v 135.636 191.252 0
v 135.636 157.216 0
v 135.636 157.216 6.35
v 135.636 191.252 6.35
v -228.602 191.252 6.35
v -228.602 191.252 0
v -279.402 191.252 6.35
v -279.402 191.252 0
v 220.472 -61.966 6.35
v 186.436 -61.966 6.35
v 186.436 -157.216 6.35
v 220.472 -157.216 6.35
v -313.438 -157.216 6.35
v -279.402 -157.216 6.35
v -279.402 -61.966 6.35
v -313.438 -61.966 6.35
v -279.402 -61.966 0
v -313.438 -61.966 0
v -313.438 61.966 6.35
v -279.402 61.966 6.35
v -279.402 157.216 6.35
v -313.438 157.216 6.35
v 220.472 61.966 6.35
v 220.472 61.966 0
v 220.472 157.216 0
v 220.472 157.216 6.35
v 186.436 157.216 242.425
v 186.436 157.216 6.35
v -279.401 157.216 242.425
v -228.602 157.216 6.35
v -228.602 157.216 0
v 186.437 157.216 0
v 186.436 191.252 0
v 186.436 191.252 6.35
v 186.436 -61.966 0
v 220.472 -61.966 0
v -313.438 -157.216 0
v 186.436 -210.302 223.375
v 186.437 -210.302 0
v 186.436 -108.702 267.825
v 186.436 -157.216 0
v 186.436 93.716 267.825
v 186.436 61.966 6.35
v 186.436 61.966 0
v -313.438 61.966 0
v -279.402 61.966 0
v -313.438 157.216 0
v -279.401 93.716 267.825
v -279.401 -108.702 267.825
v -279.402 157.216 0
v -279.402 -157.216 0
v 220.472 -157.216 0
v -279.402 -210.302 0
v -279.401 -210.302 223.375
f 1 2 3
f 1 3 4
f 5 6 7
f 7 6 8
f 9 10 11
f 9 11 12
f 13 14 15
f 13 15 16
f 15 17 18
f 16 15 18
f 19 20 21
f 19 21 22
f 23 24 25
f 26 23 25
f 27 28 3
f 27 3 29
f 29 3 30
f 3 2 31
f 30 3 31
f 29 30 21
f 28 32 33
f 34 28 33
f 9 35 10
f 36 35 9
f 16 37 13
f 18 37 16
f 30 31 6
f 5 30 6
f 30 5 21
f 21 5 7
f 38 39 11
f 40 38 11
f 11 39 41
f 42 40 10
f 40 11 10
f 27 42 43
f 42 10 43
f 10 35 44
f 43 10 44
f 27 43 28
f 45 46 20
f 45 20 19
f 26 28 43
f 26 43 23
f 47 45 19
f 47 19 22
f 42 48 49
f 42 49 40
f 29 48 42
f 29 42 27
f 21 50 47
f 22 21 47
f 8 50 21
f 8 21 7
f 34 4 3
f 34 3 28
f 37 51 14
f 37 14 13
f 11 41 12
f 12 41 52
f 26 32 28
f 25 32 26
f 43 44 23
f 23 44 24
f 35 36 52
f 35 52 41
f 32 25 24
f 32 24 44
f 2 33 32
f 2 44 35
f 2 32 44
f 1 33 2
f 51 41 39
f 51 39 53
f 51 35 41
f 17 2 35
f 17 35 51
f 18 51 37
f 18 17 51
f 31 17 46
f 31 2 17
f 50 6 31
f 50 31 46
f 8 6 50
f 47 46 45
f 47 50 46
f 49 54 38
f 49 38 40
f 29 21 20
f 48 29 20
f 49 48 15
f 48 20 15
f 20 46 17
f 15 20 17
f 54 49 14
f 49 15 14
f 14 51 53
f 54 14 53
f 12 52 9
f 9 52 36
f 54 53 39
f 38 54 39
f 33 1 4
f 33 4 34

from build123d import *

# Parameters (mm, degrees)
SKETCH1_W           = 465.838
SKETCH1_H           = 367.518
BOSS_EXTRUDE1_DEPTH = 3.175
SKETCH2_W           = 3.175
SKETCH2_H           = 308.082
SKETCH2_W_2         = 87.632
SKETCH2_W_3         = 89.789
SKETCH2_W_4         = 459.488
SKETCH2_H_2         = 50.8
BOSS_EXTRUDE2_DEPTH = 200.6
SKETCH11_W          = 87.632
SKETCH11_H          = 308.082
SKETCH11_W_2        = 89.789
SKETCH11_W_3        = 3.175
SKETCH11_W_4        = 459.488
SKETCH11_H_2        = 50.8
SKETCH11_H_3        = 3.175
BOSS_EXTRUDE8_DEPTH = 64.05
SKETCH10_W          = 34.036
SKETCH10_H          = 95.25
SKETCH10_W_2        = 50.8
SKETCH10_H_2        = 34.036
BOSS_EXTRUDE7_DEPTH = 6.35
CUT_EXTRUDE1_DEPTH  = 605.839795074


with BuildPart() as part:
    # Sketch1 → Boss-Extrude1 (new body)
    with BuildSketch(Plane.XY):
        with Locations((-46.4825, -26.543)):
            Rectangle(SKETCH1_W, SKETCH1_H)
    extrude(amount=BOSS_EXTRUDE1_DEPTH)

    # Sketch2 → Boss-Extrude2 (add)
    with BuildSketch(Plane.XY.offset(3.175)):
        Polygon((186.4365, -210.302), (186.4365, -157.216), (183.2615, -157.216), (183.2615, -208.016), (-276.2265, -208.016), (-276.2265, -157.216), (-279.4015, -157.216), (-279.4015, -210.302), align=None)
        Polygon((183.2615, 154.041), (186.4365, 154.041), (186.4365, 157.216), (-279.4015, 157.216), (-279.4015, -157.216), (-276.2265, -157.216), (183.2615, -157.216), (186.4365, -157.216), (186.4365, -154.041), (183.2615, -154.041), (93.4725, -154.041), (90.2975, -154.041), (0.5085, -154.041), (-2.6665, -154.041), (-92.4555, -154.041), (-95.6305, -154.041), (-185.4195, -154.041), (-188.5945, -154.041), (-276.2265, -154.041), (-276.2265, 154.041), (-188.5945, 154.041), (-185.4195, 154.041), (-95.6305, 154.041), (-92.4555, 154.041), (-2.6665, 154.041), (0.5085, 154.041), (90.2975, 154.041), (93.4725, 154.041), align=None)
        with Locations((184.849, 0)):
            Rectangle(SKETCH2_W, SKETCH2_H)
        with Locations((91.885, 0)):
            Rectangle(SKETCH2_W, SKETCH2_H)
        with Locations((-187.007, 0)):
            Rectangle(SKETCH2_W, SKETCH2_H)
        with Locations((-94.043, 0)):
            Rectangle(SKETCH2_W, SKETCH2_H)
        with Locations((-1.079, 0)):
            Rectangle(SKETCH2_W, SKETCH2_H)
        with Locations((-232.4105, 0)):
            Rectangle(SKETCH2_W_2, SKETCH2_H)
        with Locations((-140.525, 0)):
            Rectangle(SKETCH2_W_3, SKETCH2_H)
        with Locations((-47.561, 0)):
            Rectangle(SKETCH2_W_3, SKETCH2_H)
        with Locations((45.403, 0)):
            Rectangle(SKETCH2_W_3, SKETCH2_H)
        with Locations((138.367, 0)):
            Rectangle(SKETCH2_W_3, SKETCH2_H)
        with Locations((-46.4825, -182.616)):
            Rectangle(SKETCH2_W_4, SKETCH2_H_2)
    extrude(amount=BOSS_EXTRUDE2_DEPTH)

    # Sketch11 → Boss-Extrude8 (add)
    with BuildSketch(Plane.XY.offset(203.775)):
        with Locations((-232.4105, 0)):
            Rectangle(SKETCH11_W, SKETCH11_H)
        with Locations((-140.525, 0)):
            Rectangle(SKETCH11_W_2, SKETCH11_H)
        with Locations((-187.007, 0)):
            Rectangle(SKETCH11_W_3, SKETCH11_H)
        Polygon((-276.2265, -157.216), (183.2615, -157.216), (183.2615, -154.041), (93.4725, -154.041), (90.2975, -154.041), (0.5085, -154.041), (-2.6665, -154.041), (-92.4555, -154.041), (-95.6305, -154.041), (-185.4195, -154.041), (-188.5945, -154.041), (-276.2265, -154.041), align=None)
        with Locations((-46.4825, -182.616)):
            Rectangle(SKETCH11_W_4, SKETCH11_H_2)
        with Locations((-47.561, 0)):
            Rectangle(SKETCH11_W_2, SKETCH11_H)
        with Locations((-94.043, 0)):
            Rectangle(SKETCH11_W_3, SKETCH11_H)
        with Locations((45.403, 0)):
            Rectangle(SKETCH11_W_2, SKETCH11_H)
        with Locations((-1.079, 0)):
            Rectangle(SKETCH11_W_3, SKETCH11_H)
        with Locations((138.367, 0)):
            Rectangle(SKETCH11_W_2, SKETCH11_H)
        with Locations((91.885, 0)):
            Rectangle(SKETCH11_W_3, SKETCH11_H)
        with Locations((184.849, 0)):
            Rectangle(SKETCH11_W_3, SKETCH11_H)
        with Locations((184.849, -155.6285)):
            Rectangle(SKETCH11_W_3, SKETCH11_H_3)
        Polygon((-279.4015, -210.302), (186.4365, -210.302), (186.4365, -157.216), (183.2615, -157.216), (183.2615, -208.016), (-276.2265, -208.016), (-276.2265, -157.216), (-279.4015, -157.216), align=None)
        Polygon((-279.4015, 157.216), (-279.4015, -157.216), (-276.2265, -157.216), (-276.2265, -154.041), (-276.2265, 154.041), (-188.5945, 154.041), (-185.4195, 154.041), (-95.6305, 154.041), (-92.4555, 154.041), (-2.6665, 154.041), (0.5085, 154.041), (90.2975, 154.041), (93.4725, 154.041), (183.2615, 154.041), (186.4365, 154.041), (186.4365, 157.216), align=None)
    extrude(amount=BOSS_EXTRUDE8_DEPTH)

    # Sketch10 → Boss-Extrude7 (add)
    with BuildSketch(Plane.XY):
        with Locations((203.4545, 109.591)):
            Rectangle(SKETCH10_W, SKETCH10_H)
        with Locations((203.4545, -109.591)):
            Rectangle(SKETCH10_W, SKETCH10_H)
        with Locations((161.0365, 174.234)):
            Rectangle(SKETCH10_W_2, SKETCH10_H_2)
    boss_extrude7 = extrude(amount=BOSS_EXTRUDE7_DEPTH)

    # Mirror1: Boss-Extrude7 across plane
    add(boss_extrude7.mirror(Plane.ZY.offset(46.4825)))

    # Sketch12 → Cut-Extrude1 (cut, through all)
    with BuildSketch(Plane(origin=(186.4365, 0, 0), x_dir=(0, 0, -1), z_dir=(1, 0, 0))):
        Polygon((-267.825, -210.302), (-223.375, -210.302), (-267.825, -108.702), align=None)
        Polygon((-267.825, 157.216), (-267.825, 93.716), (-242.425, 157.216), align=None)
    extrude(amount=-CUT_EXTRUDE1_DEPTH, mode=Mode.SUBTRACT)


solid = part.part
